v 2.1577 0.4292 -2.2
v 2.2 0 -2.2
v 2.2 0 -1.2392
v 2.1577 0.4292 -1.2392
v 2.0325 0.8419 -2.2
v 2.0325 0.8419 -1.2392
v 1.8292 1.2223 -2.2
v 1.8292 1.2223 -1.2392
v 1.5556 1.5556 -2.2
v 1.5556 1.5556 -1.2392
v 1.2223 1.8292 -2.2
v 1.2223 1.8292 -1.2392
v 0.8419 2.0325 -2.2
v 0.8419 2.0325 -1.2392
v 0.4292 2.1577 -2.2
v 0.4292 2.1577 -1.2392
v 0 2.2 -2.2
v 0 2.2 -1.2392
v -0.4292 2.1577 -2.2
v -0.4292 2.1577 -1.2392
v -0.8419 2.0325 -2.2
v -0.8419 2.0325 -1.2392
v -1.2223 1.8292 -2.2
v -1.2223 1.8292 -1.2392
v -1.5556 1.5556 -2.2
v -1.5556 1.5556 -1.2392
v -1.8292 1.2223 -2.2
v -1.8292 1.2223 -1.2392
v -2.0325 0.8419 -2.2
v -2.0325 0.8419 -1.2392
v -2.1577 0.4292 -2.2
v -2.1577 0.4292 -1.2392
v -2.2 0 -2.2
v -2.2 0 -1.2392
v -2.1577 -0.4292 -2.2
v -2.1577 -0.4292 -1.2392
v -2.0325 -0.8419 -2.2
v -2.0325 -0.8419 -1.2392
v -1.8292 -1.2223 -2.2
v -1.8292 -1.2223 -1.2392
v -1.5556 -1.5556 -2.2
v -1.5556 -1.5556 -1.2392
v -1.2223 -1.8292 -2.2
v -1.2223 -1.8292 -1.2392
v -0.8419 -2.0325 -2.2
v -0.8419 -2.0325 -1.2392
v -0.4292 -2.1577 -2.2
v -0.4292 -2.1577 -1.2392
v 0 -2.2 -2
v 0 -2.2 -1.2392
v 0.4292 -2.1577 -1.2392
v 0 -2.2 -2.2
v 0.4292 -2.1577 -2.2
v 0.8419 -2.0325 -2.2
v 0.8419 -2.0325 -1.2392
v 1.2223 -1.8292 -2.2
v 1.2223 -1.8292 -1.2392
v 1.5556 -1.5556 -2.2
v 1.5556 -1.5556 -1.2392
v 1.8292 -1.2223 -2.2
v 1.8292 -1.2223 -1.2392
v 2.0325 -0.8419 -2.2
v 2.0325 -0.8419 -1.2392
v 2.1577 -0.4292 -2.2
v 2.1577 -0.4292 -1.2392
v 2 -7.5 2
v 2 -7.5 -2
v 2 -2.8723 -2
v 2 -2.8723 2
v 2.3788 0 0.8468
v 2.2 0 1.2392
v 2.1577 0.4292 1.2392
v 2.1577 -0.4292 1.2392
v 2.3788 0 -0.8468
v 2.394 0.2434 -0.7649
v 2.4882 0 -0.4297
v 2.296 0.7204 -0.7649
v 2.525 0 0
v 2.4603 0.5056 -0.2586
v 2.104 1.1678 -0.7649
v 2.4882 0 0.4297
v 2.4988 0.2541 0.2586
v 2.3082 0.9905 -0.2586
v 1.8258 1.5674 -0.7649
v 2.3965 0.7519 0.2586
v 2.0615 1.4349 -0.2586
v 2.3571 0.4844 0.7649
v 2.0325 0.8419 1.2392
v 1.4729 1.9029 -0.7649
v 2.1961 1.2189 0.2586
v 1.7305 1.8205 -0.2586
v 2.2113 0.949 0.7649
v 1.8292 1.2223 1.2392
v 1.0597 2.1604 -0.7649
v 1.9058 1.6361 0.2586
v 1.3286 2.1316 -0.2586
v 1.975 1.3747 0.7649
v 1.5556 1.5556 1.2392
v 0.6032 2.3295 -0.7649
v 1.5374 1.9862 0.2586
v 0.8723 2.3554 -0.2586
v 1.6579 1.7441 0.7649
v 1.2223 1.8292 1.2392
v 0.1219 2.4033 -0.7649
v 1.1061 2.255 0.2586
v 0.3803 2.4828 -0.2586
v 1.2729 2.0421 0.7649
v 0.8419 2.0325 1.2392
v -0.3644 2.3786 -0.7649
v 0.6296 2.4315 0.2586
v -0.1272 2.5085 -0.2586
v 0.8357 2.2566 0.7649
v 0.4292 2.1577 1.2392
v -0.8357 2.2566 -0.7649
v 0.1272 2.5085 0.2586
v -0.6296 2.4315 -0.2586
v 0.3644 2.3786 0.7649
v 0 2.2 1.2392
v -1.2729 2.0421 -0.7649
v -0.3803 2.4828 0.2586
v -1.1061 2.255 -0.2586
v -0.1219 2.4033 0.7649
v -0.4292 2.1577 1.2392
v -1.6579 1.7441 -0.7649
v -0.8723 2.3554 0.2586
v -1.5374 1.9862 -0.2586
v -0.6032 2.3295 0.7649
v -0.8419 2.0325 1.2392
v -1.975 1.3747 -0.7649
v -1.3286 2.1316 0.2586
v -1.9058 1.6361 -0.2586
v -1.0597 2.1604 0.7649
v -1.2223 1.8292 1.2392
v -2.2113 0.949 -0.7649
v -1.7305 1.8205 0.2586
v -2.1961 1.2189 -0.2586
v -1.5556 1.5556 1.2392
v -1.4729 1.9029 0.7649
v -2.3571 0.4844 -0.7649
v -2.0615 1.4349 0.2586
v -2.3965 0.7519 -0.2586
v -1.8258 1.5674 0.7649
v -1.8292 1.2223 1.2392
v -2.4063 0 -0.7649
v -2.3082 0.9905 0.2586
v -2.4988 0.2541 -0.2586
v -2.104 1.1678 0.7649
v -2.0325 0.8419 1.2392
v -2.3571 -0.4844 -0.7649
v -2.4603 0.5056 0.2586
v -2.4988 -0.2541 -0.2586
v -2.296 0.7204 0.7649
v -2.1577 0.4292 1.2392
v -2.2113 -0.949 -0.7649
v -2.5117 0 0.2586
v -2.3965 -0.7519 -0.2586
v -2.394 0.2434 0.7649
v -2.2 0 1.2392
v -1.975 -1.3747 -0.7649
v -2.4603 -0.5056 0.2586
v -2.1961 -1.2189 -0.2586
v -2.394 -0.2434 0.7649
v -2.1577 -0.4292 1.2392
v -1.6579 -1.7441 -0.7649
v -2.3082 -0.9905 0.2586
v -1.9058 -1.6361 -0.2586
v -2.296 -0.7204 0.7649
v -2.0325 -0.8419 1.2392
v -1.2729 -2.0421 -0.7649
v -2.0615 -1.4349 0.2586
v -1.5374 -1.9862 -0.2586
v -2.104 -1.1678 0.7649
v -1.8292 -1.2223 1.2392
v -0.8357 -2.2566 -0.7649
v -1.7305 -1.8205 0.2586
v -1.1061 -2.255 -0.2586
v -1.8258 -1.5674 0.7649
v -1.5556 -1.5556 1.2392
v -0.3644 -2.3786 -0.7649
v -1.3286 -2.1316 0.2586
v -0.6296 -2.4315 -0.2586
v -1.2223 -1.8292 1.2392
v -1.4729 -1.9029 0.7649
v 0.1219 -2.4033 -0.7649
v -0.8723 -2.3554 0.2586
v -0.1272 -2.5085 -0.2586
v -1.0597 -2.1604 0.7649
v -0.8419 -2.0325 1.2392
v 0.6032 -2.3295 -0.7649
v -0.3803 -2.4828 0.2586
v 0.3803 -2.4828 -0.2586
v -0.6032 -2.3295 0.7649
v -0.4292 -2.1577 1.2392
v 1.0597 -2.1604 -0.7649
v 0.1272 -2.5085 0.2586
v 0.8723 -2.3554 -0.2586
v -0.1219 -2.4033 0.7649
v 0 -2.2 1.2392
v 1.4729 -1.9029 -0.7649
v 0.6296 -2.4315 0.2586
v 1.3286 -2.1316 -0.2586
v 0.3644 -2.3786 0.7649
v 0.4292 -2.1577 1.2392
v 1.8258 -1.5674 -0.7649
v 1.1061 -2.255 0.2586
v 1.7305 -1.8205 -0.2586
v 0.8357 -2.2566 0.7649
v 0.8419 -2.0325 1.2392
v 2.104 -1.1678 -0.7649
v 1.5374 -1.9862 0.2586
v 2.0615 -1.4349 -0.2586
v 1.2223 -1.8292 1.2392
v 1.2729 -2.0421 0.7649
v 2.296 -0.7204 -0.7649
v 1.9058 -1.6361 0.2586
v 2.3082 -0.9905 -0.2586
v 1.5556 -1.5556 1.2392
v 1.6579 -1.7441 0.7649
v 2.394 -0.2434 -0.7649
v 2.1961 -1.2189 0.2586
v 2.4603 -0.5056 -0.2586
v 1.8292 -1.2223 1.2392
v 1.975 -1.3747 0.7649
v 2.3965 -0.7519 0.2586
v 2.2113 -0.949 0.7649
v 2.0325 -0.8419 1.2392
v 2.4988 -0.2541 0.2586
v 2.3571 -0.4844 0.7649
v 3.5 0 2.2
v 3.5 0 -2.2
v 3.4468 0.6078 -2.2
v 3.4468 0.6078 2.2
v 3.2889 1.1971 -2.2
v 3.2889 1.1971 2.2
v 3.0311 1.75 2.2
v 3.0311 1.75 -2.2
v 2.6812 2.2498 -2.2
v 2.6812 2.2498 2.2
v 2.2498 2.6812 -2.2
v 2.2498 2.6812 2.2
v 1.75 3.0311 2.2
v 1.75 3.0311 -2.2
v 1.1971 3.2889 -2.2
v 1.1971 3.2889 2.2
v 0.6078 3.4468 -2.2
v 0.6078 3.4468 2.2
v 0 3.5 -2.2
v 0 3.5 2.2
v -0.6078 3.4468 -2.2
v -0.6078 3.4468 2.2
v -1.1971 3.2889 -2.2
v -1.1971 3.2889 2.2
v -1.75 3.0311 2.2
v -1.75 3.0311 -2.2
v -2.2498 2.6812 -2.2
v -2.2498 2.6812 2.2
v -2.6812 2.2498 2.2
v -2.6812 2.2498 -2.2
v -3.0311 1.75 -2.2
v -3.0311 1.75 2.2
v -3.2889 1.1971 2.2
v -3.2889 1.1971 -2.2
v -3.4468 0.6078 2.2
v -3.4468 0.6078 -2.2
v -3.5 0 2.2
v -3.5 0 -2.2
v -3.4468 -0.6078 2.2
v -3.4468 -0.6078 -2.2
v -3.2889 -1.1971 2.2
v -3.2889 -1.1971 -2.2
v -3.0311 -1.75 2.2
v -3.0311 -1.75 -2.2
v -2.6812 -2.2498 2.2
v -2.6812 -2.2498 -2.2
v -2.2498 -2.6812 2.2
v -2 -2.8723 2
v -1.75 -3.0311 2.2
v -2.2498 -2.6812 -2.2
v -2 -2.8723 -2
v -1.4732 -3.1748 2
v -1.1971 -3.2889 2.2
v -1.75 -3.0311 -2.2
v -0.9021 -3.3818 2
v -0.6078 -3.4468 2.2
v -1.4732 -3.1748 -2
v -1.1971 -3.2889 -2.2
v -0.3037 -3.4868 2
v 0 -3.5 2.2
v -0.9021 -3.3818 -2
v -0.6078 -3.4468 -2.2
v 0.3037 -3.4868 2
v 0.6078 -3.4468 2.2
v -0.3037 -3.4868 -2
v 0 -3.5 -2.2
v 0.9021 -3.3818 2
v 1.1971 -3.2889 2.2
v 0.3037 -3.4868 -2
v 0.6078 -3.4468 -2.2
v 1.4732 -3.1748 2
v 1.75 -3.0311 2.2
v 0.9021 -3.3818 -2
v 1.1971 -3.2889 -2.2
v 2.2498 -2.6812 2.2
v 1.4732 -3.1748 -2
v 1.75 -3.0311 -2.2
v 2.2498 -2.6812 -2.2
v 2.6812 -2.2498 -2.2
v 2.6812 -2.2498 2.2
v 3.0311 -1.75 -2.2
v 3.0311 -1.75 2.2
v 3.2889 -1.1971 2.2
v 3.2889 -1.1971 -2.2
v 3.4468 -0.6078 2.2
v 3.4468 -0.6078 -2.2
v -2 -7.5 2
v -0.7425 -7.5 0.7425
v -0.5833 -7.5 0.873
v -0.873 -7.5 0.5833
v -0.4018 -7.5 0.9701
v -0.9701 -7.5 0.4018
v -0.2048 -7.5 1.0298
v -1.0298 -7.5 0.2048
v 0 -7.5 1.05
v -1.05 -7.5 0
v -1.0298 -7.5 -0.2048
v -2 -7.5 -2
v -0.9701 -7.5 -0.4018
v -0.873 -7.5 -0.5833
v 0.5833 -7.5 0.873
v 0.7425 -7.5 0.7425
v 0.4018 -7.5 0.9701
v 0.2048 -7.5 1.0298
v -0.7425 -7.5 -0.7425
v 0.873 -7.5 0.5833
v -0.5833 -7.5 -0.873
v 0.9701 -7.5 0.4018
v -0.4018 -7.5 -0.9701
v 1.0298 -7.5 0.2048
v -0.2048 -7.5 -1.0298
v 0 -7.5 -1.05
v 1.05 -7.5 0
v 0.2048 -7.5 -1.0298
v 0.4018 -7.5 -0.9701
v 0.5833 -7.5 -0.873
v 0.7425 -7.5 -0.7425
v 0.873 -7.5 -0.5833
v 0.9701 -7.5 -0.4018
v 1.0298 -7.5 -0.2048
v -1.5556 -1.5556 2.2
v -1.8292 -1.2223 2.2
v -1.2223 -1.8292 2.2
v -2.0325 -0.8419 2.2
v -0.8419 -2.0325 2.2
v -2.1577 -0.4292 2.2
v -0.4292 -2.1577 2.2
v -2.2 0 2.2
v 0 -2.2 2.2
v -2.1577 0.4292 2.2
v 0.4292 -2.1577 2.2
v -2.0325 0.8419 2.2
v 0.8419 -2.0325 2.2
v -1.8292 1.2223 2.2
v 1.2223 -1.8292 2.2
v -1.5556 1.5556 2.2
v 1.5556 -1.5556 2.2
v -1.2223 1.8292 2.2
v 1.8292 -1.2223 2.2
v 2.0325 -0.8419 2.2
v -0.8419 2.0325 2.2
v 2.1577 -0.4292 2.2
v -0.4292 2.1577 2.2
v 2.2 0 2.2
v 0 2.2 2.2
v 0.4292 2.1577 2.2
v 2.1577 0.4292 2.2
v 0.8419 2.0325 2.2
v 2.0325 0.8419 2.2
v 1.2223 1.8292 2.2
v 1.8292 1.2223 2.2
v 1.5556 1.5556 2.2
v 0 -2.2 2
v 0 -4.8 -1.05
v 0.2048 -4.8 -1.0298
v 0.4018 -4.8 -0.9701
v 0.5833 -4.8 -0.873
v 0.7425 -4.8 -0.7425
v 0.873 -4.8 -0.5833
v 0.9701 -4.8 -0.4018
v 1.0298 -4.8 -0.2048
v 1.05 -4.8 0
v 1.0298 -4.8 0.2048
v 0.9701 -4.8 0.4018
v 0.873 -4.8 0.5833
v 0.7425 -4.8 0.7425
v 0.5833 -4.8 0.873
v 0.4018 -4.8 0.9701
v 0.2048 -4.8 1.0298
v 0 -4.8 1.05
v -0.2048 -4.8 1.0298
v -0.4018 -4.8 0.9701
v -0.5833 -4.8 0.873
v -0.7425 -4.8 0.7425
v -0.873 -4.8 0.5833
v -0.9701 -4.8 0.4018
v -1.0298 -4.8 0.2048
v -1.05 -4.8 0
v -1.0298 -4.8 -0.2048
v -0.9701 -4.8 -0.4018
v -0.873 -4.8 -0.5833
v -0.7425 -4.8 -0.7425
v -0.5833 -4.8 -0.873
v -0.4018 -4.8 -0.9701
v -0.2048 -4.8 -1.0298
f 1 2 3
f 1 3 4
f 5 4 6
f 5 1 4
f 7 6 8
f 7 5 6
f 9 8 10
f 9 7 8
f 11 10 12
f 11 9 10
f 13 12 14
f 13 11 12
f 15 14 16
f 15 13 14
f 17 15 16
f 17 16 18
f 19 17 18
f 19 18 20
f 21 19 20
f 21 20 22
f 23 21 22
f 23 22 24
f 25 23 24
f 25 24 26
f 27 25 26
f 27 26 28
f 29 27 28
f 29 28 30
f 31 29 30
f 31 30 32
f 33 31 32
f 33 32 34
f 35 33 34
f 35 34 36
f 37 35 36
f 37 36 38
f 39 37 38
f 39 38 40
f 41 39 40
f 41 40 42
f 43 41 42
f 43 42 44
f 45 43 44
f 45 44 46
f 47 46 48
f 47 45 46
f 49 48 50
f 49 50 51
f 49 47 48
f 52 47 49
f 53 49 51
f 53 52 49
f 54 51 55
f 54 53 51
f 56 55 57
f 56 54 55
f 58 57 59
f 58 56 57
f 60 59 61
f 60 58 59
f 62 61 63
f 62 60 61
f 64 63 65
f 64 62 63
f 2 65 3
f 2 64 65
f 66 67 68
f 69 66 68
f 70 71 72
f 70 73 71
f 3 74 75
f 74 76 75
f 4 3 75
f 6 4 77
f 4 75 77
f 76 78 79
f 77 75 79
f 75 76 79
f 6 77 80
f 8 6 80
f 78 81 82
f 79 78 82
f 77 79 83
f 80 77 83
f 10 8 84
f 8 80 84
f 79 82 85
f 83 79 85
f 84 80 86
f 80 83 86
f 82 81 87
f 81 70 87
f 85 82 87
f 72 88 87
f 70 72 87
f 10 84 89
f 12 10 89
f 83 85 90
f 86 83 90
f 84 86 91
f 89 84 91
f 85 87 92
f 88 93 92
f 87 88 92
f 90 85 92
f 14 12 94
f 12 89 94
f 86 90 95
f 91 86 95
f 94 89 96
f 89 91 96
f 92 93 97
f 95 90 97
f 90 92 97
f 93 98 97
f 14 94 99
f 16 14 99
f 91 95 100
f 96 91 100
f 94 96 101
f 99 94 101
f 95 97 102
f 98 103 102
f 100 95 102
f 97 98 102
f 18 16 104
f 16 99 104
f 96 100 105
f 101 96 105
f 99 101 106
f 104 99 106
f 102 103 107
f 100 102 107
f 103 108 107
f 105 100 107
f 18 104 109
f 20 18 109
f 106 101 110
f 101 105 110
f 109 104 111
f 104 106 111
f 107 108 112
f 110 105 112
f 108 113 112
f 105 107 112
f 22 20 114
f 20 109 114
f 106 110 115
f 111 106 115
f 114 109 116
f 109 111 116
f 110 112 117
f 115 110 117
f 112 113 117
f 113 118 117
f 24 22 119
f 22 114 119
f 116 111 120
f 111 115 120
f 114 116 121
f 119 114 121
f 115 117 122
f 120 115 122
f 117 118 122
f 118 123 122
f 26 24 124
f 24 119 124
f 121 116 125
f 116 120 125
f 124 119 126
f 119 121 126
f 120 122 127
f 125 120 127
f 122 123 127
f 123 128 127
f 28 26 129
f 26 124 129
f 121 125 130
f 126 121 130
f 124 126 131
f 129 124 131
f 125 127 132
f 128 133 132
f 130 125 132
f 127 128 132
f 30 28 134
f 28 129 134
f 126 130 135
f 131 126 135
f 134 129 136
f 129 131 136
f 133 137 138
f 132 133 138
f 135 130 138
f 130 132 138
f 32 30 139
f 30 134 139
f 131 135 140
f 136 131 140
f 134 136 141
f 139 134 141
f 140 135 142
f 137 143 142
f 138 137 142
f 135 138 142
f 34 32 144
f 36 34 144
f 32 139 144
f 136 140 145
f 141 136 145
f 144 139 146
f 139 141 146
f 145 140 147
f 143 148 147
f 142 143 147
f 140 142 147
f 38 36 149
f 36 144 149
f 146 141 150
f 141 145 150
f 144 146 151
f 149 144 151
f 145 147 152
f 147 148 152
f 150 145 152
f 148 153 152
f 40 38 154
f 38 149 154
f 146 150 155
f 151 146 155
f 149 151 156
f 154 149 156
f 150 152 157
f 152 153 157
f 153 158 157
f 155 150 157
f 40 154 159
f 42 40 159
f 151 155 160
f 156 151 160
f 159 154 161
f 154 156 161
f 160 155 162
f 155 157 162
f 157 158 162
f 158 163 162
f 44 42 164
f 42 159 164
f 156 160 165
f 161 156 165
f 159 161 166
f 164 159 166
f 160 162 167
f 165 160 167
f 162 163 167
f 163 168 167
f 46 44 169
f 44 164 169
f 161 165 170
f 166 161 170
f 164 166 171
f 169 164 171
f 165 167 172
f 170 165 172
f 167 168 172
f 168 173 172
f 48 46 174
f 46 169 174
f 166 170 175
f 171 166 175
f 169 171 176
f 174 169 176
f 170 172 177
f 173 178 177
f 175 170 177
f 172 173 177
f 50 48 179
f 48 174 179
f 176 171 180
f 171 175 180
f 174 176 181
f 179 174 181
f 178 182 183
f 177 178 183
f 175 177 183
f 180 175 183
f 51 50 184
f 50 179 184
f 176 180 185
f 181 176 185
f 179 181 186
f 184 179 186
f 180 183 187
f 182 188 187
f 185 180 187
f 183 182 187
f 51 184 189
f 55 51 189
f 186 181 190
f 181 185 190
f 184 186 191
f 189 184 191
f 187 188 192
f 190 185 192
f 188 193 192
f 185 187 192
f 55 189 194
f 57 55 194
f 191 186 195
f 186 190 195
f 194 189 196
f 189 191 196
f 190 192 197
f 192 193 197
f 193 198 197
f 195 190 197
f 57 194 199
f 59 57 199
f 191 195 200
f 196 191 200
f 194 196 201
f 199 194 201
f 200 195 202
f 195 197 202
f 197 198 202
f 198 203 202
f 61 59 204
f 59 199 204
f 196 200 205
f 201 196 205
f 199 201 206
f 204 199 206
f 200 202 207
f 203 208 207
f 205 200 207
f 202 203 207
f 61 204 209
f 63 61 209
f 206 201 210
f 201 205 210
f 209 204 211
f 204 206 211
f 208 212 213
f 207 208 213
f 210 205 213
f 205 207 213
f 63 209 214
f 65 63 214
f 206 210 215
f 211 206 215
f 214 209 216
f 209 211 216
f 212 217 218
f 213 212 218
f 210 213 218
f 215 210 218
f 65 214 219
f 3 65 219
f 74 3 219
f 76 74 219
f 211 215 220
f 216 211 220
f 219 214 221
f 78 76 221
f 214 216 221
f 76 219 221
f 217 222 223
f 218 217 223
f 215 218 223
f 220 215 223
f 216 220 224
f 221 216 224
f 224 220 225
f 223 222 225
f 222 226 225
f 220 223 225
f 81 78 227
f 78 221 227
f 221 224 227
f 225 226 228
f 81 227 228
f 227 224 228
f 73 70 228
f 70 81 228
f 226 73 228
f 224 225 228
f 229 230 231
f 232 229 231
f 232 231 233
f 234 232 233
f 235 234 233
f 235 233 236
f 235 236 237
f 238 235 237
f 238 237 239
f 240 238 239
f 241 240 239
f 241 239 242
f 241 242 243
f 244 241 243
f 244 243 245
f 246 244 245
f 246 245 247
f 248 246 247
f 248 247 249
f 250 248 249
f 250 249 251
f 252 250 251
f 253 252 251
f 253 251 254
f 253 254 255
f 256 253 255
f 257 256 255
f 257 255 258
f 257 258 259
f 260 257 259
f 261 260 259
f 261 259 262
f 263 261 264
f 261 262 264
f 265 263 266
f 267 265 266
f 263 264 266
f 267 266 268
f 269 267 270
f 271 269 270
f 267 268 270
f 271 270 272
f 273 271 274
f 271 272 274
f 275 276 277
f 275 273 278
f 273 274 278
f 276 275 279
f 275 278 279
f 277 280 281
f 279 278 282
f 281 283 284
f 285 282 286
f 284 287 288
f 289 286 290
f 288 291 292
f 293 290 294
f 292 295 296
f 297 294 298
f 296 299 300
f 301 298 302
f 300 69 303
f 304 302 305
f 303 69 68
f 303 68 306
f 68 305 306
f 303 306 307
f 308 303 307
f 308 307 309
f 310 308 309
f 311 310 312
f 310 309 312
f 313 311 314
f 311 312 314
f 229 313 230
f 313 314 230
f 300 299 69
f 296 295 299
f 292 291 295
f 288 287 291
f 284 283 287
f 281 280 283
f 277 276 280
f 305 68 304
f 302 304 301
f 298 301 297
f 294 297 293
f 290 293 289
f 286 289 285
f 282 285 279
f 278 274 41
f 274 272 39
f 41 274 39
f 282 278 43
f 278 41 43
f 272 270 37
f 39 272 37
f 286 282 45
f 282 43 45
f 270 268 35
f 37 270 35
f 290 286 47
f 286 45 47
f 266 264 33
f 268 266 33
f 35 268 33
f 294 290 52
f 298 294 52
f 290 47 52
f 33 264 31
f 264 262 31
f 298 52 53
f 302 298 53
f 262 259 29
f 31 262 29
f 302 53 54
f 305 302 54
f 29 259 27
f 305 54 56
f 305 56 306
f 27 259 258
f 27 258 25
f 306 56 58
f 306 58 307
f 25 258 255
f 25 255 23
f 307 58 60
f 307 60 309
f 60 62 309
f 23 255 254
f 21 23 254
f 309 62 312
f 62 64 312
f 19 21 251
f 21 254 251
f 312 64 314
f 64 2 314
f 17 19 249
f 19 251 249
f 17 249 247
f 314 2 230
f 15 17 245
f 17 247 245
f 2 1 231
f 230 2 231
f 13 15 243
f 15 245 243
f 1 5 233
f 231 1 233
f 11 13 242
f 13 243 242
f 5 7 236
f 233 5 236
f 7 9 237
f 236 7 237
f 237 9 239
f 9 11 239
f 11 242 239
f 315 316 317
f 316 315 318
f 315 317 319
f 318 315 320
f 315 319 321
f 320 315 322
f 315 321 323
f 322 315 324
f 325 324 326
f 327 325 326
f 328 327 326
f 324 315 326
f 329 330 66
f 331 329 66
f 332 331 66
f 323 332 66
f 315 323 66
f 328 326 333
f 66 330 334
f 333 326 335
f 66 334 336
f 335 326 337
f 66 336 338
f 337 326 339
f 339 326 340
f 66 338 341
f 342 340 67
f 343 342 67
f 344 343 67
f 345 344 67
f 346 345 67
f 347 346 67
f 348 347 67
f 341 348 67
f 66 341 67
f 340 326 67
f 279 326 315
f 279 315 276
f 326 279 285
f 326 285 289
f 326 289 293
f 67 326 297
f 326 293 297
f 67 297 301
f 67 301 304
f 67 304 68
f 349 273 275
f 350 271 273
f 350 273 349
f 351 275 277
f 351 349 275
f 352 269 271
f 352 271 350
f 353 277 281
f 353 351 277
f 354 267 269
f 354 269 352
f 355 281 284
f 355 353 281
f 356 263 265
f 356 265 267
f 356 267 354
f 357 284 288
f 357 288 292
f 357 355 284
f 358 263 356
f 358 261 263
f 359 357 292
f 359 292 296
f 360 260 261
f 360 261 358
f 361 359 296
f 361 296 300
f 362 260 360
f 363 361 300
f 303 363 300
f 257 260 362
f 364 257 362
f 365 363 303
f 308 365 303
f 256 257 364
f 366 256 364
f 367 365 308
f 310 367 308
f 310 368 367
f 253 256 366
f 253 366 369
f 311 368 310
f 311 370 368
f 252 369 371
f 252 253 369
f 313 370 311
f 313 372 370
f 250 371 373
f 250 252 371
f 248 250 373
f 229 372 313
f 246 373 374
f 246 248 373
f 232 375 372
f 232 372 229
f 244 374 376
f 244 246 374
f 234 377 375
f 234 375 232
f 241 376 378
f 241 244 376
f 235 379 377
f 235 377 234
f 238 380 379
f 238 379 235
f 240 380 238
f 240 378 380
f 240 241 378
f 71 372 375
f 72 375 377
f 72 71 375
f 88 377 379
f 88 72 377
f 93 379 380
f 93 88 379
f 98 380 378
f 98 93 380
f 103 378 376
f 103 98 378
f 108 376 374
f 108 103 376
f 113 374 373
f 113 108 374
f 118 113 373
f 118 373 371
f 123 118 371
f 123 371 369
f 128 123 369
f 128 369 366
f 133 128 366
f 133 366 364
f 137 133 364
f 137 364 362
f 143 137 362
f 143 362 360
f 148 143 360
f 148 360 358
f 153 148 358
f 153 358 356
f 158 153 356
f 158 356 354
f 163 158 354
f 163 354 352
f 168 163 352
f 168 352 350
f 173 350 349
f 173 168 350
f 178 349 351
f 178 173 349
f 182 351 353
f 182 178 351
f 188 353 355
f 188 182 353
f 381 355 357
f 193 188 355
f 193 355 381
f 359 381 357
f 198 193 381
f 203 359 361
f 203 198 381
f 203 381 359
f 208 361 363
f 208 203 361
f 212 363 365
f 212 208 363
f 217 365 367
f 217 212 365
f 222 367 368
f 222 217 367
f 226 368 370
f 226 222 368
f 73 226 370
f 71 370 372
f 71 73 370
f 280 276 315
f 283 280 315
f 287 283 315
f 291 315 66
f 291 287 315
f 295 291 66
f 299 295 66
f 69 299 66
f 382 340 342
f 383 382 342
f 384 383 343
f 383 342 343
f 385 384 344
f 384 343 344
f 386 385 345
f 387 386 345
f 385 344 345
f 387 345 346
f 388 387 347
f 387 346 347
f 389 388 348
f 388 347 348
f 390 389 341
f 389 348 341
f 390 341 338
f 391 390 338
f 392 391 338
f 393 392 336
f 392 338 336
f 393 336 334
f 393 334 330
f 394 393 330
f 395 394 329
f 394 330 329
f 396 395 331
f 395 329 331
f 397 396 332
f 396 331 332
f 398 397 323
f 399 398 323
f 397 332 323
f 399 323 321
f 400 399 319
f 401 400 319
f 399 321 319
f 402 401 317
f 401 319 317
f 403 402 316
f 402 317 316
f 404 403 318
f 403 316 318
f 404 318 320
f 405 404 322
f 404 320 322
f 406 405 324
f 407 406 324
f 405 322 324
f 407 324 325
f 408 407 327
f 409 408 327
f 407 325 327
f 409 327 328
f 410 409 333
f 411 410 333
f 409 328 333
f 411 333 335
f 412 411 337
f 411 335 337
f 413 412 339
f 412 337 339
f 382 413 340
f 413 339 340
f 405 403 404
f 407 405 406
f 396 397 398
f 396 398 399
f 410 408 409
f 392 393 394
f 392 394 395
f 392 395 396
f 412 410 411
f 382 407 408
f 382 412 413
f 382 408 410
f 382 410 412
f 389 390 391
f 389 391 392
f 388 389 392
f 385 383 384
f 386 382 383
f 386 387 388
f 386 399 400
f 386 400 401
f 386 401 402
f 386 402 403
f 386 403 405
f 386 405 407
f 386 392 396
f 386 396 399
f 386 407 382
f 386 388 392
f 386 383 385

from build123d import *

# Parameters (mm, degrees)
SOCKET_OUTER_EYE_AND_MOUTHS_START = -2.2
SKETCH1_R                         = 3.5
SKETCH1_R_2                       = 2.2
SOCKET_OUTER_EYE_AND_MOUTHS_DEPTH = 4.4
ROD_CONNECTION_NECK_START         = -2
SKETCH2_W                         = 4
SKETCH2_H                         = 5.3
ROD_CONNECTION_NECK_DEPTH         = 4
SKETCH3_R                         = 1.05
D2P1_ROD_BOND_BORE_DEPTH          = 2.7


# Read off the part's stored shape, not the designer's step: Spherical_Socket_D5p05
with BuildPart() as part:
    # Sketch1 → Socket_Outer_Eye_And_Mouths (new body)
    with BuildSketch(Plane.XY.offset(SOCKET_OUTER_EYE_AND_MOUTHS_START)):
        Circle(SKETCH1_R)
        Circle(SKETCH1_R_2, mode=Mode.SUBTRACT)
    extrude(amount=SOCKET_OUTER_EYE_AND_MOUTHS_DEPTH)

    # Sketch2 → Rod_Connection_Neck (add)
    with BuildSketch(Plane.XY.offset(ROD_CONNECTION_NECK_START)):
        with Locations((0, -4.85)):
            Rectangle(SKETCH2_W, SKETCH2_H)
    extrude(amount=ROD_CONNECTION_NECK_DEPTH)

    # Spherical_Socket_D5p05 outline → Spherical_Socket_D5p05 (revolve, cut)
    with BuildSketch(Plane.XZ):
        with BuildLine():
            Line((2.199999999, 1.239203375), (2.199999999, -1.239203375))
            ThreePointArc((2.199999999, -1.239203375), (2.525, 0), (2.199999999, 1.239203375))
        make_face()
    revolve(axis=Axis((0, 0, 0), (0, 0, 1)), mode=Mode.SUBTRACT)

    # Sketch3 → D2p1_Rod_Bond_Bore (cut)
    with BuildSketch(Plane.XZ.offset(7.5)):
        with Locations(Location((0, 0, 0), (0, 0, 270))):
            Circle(SKETCH3_R)
    extrude(amount=-D2P1_ROD_BOND_BORE_DEPTH, mode=Mode.SUBTRACT)


solid = part.part
